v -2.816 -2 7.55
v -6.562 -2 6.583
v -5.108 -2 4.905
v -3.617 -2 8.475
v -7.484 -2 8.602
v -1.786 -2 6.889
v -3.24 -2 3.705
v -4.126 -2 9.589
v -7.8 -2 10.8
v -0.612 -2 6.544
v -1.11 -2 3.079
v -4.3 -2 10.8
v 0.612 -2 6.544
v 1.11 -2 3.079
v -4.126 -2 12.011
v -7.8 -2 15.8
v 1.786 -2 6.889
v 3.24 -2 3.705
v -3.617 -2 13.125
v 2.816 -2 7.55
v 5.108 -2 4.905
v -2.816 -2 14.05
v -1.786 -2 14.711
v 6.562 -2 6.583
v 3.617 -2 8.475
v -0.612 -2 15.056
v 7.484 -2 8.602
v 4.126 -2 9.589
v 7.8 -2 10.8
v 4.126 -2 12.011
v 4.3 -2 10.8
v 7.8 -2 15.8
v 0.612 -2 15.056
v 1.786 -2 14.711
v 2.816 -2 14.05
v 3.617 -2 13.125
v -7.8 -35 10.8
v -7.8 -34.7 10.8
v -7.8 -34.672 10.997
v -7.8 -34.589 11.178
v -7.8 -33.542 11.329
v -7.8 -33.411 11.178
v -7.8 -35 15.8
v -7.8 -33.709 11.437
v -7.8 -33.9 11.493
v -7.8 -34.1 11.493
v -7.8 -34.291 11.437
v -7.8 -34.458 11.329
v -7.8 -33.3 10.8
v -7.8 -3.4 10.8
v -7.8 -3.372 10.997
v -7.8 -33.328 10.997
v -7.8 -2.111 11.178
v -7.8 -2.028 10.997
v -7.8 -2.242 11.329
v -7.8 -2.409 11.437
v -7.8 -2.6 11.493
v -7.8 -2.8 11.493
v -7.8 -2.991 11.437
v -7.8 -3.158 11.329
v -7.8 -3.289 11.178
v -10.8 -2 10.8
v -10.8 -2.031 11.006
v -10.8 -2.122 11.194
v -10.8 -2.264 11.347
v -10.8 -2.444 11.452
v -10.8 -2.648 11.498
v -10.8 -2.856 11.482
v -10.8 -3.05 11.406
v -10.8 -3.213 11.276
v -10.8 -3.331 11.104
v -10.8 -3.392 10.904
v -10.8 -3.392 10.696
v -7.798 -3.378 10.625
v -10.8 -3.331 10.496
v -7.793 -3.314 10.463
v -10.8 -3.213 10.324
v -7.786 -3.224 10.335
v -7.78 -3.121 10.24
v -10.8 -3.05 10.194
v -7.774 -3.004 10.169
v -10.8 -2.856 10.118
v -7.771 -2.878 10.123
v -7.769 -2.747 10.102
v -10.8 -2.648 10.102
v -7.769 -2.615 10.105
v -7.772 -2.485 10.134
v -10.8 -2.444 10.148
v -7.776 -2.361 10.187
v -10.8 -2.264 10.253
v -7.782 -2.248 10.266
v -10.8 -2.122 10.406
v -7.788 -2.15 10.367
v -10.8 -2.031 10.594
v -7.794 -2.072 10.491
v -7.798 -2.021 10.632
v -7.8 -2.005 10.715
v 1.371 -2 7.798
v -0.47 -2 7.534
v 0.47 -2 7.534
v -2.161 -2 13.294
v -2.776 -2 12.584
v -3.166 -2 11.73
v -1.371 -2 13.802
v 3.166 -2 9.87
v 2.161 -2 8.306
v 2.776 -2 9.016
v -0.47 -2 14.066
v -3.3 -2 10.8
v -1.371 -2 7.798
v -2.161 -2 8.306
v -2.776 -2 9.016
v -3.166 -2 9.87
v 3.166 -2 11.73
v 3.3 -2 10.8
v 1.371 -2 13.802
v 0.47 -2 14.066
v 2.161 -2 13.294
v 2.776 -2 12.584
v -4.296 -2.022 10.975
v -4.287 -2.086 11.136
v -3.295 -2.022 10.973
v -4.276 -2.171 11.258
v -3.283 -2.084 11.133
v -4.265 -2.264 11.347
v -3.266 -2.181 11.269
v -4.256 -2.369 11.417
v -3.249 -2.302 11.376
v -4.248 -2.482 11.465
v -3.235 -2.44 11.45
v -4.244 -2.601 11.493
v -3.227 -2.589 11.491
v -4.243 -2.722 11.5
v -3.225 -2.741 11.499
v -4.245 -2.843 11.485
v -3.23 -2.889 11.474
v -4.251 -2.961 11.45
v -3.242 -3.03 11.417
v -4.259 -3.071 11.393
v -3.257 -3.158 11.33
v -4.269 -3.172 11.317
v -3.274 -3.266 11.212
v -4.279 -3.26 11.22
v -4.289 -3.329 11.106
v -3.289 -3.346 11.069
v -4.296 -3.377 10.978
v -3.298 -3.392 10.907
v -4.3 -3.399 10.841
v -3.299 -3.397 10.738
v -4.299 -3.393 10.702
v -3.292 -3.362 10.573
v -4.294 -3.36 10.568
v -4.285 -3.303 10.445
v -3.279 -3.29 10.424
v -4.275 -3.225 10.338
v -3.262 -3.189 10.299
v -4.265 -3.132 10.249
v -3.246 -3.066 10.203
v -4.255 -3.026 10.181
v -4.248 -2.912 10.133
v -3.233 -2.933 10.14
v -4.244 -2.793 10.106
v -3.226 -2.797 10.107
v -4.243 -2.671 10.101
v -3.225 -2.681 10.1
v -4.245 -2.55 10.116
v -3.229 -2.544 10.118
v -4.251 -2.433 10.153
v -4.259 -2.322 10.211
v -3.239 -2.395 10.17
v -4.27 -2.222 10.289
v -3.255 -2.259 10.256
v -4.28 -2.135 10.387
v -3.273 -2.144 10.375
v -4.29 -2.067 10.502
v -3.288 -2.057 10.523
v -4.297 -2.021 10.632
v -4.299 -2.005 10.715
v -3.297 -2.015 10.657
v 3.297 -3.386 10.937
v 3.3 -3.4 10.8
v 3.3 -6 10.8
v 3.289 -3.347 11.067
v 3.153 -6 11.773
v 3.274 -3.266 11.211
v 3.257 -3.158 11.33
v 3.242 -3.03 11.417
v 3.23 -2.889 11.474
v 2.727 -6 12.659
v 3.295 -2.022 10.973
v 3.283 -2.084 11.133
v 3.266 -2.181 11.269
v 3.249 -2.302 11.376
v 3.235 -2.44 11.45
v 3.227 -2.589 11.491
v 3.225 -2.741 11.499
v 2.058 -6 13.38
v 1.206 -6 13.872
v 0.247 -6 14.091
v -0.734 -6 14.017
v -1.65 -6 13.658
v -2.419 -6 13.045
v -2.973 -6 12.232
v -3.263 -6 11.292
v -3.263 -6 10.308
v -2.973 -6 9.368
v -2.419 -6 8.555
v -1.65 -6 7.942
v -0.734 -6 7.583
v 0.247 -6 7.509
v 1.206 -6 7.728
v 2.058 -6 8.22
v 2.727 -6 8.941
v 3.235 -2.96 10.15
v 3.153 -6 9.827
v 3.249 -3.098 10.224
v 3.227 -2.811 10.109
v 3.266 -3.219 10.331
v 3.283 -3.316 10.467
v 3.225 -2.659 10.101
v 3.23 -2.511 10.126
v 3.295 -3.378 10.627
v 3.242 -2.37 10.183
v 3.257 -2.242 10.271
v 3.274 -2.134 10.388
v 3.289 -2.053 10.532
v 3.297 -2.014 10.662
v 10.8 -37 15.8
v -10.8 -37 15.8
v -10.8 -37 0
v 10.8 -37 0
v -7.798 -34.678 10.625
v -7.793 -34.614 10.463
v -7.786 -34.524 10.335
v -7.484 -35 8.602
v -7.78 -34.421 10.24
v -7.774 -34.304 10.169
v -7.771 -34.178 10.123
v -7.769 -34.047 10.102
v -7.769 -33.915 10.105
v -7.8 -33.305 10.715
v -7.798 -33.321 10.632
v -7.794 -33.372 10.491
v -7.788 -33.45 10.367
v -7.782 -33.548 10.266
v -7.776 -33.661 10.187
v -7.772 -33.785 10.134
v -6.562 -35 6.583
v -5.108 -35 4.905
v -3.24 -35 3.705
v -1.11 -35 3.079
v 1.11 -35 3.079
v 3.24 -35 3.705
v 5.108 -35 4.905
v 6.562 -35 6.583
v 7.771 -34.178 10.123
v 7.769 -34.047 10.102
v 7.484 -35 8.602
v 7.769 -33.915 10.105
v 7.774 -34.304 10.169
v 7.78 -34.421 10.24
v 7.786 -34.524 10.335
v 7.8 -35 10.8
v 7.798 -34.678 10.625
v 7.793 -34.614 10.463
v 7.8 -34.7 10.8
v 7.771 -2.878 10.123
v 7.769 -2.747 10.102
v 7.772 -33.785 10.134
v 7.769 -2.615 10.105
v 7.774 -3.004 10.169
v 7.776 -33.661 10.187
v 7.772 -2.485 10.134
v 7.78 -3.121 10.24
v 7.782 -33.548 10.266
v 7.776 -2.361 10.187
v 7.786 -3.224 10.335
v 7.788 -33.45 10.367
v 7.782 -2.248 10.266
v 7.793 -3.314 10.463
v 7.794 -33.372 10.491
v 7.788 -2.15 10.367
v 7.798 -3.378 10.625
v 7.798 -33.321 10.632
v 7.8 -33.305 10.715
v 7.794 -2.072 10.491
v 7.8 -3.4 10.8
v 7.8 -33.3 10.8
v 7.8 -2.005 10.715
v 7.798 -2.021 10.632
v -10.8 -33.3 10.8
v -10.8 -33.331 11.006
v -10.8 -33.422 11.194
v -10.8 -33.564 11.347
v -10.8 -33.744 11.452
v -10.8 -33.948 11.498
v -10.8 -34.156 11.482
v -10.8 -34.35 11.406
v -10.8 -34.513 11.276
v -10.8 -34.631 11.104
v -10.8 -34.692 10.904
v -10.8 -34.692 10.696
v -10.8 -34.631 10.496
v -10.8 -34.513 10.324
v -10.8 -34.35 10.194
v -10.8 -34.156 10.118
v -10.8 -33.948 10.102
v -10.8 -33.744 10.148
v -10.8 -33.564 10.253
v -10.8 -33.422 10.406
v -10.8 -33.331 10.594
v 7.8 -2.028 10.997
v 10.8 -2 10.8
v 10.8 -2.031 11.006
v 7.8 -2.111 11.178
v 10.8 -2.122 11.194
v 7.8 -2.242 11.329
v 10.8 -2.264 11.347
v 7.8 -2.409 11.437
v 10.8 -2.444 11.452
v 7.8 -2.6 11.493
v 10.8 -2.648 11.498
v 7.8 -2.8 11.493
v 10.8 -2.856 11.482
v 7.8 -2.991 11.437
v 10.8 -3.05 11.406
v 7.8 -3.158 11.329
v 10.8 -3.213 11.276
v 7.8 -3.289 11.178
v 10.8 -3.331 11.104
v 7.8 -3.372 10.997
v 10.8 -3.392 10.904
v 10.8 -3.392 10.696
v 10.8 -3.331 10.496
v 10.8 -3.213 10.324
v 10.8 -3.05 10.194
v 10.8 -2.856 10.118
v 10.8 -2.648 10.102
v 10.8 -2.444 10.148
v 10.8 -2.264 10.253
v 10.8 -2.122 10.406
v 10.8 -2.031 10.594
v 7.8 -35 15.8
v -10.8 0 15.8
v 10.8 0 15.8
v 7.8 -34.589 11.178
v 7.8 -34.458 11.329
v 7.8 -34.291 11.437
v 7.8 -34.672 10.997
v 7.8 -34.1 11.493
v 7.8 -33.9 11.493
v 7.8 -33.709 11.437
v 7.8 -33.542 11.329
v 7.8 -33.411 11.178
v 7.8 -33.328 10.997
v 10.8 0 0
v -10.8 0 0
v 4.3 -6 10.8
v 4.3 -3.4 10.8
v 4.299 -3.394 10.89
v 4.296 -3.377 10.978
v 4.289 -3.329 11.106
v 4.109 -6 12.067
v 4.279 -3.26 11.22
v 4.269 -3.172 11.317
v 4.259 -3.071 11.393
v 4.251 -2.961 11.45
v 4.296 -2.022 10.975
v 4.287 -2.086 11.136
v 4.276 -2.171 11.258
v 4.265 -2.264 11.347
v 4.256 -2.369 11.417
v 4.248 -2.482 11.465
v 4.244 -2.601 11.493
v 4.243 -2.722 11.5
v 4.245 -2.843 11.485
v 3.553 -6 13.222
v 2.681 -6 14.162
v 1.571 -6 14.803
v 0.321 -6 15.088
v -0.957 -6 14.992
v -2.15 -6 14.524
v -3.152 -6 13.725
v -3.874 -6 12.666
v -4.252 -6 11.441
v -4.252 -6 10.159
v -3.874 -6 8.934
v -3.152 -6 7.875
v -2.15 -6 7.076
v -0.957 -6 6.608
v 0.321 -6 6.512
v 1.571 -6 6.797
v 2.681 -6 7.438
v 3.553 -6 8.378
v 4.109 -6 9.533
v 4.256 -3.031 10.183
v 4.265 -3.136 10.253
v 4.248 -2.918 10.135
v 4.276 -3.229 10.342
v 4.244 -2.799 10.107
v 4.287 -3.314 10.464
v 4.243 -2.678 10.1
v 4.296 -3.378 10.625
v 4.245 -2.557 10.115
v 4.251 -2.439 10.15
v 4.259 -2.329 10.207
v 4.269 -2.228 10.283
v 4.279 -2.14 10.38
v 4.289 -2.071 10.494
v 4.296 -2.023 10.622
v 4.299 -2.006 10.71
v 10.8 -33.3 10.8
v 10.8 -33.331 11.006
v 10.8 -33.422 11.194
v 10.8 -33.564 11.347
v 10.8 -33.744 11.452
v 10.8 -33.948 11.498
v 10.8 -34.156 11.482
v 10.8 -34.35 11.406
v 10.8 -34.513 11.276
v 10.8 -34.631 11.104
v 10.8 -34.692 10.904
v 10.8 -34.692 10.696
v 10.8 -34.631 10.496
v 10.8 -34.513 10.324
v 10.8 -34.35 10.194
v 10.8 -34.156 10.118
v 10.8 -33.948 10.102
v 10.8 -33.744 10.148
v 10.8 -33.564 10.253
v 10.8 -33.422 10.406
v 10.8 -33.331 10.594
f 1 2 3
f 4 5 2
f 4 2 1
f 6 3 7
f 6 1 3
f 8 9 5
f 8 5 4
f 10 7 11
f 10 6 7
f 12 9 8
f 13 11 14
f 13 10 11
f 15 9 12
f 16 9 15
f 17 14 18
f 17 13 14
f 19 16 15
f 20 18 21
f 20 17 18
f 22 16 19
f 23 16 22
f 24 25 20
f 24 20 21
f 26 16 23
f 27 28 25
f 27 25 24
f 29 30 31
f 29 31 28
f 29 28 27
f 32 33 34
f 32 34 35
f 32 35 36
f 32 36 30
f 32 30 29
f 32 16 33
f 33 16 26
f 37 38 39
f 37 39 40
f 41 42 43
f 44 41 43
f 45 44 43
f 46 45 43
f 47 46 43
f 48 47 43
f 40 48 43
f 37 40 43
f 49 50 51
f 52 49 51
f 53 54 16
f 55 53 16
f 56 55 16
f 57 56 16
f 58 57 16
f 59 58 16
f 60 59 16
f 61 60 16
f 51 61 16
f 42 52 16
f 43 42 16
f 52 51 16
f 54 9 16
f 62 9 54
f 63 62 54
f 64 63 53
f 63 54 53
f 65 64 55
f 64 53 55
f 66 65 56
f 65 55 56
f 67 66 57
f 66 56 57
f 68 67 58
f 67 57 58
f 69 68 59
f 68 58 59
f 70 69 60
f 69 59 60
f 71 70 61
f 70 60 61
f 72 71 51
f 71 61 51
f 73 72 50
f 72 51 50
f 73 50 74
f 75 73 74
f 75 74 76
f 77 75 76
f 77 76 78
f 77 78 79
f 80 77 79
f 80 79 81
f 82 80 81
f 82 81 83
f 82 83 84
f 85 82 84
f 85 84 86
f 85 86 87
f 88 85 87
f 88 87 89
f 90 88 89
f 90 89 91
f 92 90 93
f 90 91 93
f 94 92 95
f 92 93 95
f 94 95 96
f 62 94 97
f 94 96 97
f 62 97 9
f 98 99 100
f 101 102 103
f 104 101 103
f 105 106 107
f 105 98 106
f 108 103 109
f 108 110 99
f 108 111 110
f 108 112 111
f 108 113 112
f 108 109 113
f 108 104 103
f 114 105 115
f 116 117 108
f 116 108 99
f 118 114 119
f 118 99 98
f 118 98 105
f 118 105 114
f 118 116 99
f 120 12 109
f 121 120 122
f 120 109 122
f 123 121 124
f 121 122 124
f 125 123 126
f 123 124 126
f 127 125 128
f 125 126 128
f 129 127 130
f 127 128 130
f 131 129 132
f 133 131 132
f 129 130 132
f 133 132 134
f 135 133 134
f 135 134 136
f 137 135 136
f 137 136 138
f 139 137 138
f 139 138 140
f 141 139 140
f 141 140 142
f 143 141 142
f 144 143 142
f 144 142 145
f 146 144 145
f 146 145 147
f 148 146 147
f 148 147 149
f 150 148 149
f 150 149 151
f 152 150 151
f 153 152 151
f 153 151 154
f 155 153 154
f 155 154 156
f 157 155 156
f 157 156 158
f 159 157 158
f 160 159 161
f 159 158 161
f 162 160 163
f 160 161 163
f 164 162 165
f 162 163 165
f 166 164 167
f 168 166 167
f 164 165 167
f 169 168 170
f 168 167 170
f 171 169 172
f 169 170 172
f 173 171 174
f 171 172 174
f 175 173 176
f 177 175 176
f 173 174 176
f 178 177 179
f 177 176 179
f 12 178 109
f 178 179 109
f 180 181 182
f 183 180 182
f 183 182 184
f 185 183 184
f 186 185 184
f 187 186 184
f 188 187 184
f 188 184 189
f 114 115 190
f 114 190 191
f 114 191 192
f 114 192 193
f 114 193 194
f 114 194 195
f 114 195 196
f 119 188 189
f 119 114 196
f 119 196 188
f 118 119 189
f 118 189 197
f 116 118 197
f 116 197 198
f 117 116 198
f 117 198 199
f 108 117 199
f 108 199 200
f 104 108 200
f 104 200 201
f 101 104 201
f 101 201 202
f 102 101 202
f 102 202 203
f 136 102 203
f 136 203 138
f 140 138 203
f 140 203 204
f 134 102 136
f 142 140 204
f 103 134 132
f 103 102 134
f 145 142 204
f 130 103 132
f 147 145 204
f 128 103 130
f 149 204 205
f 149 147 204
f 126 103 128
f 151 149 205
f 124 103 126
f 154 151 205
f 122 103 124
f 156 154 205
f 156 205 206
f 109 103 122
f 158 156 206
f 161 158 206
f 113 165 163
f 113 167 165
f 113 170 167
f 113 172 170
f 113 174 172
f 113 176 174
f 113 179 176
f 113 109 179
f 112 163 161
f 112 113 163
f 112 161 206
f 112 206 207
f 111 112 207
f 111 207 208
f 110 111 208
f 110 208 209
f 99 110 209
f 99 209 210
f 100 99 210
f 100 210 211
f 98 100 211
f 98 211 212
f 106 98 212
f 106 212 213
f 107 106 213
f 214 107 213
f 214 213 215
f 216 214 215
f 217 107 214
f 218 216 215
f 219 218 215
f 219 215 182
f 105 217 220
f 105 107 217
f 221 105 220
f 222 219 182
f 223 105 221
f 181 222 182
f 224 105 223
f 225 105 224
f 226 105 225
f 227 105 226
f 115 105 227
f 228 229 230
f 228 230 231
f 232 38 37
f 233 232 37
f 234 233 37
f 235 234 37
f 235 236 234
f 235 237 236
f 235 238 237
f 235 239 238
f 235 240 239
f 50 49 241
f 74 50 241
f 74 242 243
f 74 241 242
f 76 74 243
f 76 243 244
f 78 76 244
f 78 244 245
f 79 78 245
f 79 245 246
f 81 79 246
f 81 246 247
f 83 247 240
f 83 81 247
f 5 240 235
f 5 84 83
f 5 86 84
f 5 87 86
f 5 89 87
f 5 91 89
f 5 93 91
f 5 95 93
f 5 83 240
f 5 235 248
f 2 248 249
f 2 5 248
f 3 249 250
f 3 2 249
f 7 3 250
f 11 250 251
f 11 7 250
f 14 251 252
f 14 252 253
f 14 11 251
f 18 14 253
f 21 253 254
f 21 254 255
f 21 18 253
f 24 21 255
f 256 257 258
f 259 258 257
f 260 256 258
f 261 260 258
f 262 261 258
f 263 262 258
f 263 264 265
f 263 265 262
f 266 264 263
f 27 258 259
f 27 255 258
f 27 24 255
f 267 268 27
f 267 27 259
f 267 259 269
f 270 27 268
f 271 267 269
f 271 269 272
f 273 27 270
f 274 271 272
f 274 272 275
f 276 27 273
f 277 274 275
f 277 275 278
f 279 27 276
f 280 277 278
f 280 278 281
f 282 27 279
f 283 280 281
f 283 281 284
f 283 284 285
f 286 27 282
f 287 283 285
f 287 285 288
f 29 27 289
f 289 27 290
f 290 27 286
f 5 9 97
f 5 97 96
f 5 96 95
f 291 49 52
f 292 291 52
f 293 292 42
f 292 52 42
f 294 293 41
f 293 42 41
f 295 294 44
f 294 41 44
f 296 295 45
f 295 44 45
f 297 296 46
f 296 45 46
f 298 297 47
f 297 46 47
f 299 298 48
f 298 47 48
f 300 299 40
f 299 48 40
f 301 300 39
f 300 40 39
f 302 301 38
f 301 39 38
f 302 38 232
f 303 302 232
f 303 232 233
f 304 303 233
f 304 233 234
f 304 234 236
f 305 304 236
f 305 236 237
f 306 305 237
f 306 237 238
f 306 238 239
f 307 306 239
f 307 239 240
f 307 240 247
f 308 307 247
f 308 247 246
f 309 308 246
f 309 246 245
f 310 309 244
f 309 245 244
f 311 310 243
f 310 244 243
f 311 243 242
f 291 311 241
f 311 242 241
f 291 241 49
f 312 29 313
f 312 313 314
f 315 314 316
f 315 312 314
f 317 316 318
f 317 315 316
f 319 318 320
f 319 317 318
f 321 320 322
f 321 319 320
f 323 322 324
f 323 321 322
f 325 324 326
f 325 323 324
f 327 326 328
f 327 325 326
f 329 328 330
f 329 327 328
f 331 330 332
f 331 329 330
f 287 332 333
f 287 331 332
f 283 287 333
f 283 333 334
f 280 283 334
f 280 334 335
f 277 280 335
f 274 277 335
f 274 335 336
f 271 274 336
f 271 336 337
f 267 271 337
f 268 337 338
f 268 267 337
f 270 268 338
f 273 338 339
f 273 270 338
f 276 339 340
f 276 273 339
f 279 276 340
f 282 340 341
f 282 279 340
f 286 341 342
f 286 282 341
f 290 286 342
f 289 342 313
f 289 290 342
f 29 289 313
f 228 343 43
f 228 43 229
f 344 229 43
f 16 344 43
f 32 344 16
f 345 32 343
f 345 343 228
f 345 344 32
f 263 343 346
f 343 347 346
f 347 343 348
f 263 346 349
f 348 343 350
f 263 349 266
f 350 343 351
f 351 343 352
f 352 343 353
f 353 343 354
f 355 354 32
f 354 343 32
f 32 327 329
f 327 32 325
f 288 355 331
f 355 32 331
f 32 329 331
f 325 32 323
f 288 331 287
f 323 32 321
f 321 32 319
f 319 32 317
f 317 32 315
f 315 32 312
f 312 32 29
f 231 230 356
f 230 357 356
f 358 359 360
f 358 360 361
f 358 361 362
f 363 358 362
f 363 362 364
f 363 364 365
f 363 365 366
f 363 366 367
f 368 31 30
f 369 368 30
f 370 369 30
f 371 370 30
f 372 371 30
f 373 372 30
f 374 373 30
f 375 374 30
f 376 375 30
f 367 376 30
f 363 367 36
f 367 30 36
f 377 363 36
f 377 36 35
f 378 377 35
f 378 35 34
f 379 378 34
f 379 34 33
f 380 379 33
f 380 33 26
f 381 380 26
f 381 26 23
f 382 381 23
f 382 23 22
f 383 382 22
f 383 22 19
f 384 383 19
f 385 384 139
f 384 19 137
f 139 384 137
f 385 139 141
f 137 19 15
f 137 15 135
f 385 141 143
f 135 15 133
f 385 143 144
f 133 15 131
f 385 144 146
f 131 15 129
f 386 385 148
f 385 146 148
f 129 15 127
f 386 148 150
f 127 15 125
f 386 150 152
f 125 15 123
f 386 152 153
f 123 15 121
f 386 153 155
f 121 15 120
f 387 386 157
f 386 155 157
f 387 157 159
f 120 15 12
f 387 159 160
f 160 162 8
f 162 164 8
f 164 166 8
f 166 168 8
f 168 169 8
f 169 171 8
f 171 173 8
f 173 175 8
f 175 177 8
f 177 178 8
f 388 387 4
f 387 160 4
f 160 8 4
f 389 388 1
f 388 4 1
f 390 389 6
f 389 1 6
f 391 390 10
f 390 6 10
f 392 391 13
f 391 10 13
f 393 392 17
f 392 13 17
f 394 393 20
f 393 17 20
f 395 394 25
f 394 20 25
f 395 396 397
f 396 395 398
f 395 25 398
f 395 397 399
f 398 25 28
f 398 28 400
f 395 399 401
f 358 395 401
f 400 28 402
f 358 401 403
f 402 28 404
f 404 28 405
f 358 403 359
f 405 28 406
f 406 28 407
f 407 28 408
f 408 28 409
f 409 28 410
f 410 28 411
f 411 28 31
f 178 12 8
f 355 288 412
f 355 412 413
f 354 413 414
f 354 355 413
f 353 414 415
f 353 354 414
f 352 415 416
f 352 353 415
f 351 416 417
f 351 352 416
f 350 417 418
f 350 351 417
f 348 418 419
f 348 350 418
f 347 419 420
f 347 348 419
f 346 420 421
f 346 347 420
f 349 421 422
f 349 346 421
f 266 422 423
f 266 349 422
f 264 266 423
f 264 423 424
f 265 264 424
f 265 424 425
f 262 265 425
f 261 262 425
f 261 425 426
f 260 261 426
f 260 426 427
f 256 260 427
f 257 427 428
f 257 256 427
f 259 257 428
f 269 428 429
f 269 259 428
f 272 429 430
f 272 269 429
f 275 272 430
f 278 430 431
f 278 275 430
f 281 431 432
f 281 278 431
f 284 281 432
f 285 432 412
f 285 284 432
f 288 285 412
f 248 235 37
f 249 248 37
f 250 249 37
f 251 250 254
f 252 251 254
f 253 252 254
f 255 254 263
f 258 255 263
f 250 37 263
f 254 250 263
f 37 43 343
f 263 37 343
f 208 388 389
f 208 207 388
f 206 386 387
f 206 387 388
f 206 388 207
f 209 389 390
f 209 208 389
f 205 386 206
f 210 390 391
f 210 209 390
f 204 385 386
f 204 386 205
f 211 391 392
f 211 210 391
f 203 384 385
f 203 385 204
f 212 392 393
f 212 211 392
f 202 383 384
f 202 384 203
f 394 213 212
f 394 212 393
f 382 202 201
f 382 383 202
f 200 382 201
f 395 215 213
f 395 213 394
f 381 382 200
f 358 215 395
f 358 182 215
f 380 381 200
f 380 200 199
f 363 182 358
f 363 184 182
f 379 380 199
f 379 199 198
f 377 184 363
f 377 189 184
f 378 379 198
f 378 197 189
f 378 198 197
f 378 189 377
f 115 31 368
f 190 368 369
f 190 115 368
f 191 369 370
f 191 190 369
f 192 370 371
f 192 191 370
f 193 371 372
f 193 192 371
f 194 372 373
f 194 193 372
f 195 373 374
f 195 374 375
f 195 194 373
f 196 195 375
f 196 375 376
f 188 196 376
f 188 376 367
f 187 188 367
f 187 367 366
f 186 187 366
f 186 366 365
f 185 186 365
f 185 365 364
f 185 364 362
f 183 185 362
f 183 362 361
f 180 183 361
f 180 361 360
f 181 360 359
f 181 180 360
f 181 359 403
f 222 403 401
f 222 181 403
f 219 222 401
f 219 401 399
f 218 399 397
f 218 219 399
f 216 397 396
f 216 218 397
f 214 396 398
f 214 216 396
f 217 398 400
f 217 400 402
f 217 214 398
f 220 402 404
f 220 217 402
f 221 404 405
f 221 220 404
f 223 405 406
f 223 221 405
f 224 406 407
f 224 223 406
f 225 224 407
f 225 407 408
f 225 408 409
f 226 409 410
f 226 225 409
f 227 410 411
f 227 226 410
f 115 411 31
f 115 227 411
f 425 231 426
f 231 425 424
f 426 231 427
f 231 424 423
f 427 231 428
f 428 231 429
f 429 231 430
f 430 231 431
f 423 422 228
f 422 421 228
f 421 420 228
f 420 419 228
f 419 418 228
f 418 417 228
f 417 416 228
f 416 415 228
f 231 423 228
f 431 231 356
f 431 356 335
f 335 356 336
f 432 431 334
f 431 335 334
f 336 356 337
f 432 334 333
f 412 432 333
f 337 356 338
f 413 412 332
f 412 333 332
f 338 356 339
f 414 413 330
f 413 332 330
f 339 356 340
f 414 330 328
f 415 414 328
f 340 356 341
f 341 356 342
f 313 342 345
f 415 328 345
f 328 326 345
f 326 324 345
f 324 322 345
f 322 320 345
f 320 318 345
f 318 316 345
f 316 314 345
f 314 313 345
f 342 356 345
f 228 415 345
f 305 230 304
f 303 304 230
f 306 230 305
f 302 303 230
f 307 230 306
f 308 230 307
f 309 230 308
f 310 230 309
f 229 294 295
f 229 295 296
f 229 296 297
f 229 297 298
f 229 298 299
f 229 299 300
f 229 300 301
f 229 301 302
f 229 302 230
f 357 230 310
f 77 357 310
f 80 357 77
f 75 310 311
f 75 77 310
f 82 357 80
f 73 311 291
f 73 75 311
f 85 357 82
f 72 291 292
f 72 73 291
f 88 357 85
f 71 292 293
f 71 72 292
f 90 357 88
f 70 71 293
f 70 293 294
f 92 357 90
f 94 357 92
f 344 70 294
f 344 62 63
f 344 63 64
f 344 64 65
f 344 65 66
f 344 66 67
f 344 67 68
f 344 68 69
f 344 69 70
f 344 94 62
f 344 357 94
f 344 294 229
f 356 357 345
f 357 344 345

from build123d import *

# Parameters (mm, degrees)
PAD_DEPTH         = 35
SKETCH001_W       = 21.6
SKETCH001_H       = 15.8
PAD001_DEPTH      = 2
SKETCH002_R       = 4.3
SKETCH002_R_2     = 3.3
PAD002_DEPTH      = 6
SKETCH003_R       = 0.7
POCKET_DEPTH      = 10.801
POCKET_DEPTH_BACK = 10.801
SKETCH004_W       = 21.6
SKETCH004_H       = 15.8
PAD003_DEPTH      = 2


with BuildPart() as part:
    # Sketch → Pad (new body)
    with BuildSketch(Plane.XZ):
        with BuildLine():
            Line((-10.8, 0), (10.8, 0))
            Line((10.8, 0), (10.8, 15.8))
            Line((10.8, 15.8), (7.8, 15.8))
            Line((7.8, 15.8), (7.8, 10.8))
            ThreePointArc((-7.8, 10.8), (0, 3), (7.8, 10.8))
            Line((-7.8, 10.8), (-7.8, 15.8))
            Line((-7.8, 15.8), (-10.8, 15.8))
            Line((-10.8, 15.8), (-10.8, 0))
        make_face()
    extrude(amount=PAD_DEPTH)

    # Sketch001 → Pad001 (join)
    with BuildSketch(Plane.XZ):
        with Locations((0, 7.9)):
            Rectangle(SKETCH001_W, SKETCH001_H)
    extrude(amount=PAD001_DEPTH)

    # Sketch002 → Pad002 (join)
    with BuildSketch(Plane.XZ):
        with Locations((0, 10.8)):
            Circle(SKETCH002_R)
        with Locations((0, 10.8)):
            Circle(SKETCH002_R_2, mode=Mode.SUBTRACT)
    extrude(amount=PAD002_DEPTH)

    # Sketch003 → Pocket (cut, two sides)
    with BuildSketch(Plane.YZ) as pocket_sk:
        with Locations((-2.7, 10.8)):
            Circle(SKETCH003_R)
        with Locations((-34, 10.8)):
            Circle(SKETCH003_R)
    extrude(amount=-POCKET_DEPTH, mode=Mode.SUBTRACT)
    extrude(pocket_sk.sketch, amount=POCKET_DEPTH_BACK, mode=Mode.SUBTRACT)

    # Sketch004 (on DatumPlane) → Pad003 (join)
    with BuildSketch(Plane.XZ.offset(35)):
        with Locations((0, 7.9)):
            Rectangle(SKETCH004_W, SKETCH004_H)
    extrude(amount=PAD003_DEPTH)


solid = part.part
